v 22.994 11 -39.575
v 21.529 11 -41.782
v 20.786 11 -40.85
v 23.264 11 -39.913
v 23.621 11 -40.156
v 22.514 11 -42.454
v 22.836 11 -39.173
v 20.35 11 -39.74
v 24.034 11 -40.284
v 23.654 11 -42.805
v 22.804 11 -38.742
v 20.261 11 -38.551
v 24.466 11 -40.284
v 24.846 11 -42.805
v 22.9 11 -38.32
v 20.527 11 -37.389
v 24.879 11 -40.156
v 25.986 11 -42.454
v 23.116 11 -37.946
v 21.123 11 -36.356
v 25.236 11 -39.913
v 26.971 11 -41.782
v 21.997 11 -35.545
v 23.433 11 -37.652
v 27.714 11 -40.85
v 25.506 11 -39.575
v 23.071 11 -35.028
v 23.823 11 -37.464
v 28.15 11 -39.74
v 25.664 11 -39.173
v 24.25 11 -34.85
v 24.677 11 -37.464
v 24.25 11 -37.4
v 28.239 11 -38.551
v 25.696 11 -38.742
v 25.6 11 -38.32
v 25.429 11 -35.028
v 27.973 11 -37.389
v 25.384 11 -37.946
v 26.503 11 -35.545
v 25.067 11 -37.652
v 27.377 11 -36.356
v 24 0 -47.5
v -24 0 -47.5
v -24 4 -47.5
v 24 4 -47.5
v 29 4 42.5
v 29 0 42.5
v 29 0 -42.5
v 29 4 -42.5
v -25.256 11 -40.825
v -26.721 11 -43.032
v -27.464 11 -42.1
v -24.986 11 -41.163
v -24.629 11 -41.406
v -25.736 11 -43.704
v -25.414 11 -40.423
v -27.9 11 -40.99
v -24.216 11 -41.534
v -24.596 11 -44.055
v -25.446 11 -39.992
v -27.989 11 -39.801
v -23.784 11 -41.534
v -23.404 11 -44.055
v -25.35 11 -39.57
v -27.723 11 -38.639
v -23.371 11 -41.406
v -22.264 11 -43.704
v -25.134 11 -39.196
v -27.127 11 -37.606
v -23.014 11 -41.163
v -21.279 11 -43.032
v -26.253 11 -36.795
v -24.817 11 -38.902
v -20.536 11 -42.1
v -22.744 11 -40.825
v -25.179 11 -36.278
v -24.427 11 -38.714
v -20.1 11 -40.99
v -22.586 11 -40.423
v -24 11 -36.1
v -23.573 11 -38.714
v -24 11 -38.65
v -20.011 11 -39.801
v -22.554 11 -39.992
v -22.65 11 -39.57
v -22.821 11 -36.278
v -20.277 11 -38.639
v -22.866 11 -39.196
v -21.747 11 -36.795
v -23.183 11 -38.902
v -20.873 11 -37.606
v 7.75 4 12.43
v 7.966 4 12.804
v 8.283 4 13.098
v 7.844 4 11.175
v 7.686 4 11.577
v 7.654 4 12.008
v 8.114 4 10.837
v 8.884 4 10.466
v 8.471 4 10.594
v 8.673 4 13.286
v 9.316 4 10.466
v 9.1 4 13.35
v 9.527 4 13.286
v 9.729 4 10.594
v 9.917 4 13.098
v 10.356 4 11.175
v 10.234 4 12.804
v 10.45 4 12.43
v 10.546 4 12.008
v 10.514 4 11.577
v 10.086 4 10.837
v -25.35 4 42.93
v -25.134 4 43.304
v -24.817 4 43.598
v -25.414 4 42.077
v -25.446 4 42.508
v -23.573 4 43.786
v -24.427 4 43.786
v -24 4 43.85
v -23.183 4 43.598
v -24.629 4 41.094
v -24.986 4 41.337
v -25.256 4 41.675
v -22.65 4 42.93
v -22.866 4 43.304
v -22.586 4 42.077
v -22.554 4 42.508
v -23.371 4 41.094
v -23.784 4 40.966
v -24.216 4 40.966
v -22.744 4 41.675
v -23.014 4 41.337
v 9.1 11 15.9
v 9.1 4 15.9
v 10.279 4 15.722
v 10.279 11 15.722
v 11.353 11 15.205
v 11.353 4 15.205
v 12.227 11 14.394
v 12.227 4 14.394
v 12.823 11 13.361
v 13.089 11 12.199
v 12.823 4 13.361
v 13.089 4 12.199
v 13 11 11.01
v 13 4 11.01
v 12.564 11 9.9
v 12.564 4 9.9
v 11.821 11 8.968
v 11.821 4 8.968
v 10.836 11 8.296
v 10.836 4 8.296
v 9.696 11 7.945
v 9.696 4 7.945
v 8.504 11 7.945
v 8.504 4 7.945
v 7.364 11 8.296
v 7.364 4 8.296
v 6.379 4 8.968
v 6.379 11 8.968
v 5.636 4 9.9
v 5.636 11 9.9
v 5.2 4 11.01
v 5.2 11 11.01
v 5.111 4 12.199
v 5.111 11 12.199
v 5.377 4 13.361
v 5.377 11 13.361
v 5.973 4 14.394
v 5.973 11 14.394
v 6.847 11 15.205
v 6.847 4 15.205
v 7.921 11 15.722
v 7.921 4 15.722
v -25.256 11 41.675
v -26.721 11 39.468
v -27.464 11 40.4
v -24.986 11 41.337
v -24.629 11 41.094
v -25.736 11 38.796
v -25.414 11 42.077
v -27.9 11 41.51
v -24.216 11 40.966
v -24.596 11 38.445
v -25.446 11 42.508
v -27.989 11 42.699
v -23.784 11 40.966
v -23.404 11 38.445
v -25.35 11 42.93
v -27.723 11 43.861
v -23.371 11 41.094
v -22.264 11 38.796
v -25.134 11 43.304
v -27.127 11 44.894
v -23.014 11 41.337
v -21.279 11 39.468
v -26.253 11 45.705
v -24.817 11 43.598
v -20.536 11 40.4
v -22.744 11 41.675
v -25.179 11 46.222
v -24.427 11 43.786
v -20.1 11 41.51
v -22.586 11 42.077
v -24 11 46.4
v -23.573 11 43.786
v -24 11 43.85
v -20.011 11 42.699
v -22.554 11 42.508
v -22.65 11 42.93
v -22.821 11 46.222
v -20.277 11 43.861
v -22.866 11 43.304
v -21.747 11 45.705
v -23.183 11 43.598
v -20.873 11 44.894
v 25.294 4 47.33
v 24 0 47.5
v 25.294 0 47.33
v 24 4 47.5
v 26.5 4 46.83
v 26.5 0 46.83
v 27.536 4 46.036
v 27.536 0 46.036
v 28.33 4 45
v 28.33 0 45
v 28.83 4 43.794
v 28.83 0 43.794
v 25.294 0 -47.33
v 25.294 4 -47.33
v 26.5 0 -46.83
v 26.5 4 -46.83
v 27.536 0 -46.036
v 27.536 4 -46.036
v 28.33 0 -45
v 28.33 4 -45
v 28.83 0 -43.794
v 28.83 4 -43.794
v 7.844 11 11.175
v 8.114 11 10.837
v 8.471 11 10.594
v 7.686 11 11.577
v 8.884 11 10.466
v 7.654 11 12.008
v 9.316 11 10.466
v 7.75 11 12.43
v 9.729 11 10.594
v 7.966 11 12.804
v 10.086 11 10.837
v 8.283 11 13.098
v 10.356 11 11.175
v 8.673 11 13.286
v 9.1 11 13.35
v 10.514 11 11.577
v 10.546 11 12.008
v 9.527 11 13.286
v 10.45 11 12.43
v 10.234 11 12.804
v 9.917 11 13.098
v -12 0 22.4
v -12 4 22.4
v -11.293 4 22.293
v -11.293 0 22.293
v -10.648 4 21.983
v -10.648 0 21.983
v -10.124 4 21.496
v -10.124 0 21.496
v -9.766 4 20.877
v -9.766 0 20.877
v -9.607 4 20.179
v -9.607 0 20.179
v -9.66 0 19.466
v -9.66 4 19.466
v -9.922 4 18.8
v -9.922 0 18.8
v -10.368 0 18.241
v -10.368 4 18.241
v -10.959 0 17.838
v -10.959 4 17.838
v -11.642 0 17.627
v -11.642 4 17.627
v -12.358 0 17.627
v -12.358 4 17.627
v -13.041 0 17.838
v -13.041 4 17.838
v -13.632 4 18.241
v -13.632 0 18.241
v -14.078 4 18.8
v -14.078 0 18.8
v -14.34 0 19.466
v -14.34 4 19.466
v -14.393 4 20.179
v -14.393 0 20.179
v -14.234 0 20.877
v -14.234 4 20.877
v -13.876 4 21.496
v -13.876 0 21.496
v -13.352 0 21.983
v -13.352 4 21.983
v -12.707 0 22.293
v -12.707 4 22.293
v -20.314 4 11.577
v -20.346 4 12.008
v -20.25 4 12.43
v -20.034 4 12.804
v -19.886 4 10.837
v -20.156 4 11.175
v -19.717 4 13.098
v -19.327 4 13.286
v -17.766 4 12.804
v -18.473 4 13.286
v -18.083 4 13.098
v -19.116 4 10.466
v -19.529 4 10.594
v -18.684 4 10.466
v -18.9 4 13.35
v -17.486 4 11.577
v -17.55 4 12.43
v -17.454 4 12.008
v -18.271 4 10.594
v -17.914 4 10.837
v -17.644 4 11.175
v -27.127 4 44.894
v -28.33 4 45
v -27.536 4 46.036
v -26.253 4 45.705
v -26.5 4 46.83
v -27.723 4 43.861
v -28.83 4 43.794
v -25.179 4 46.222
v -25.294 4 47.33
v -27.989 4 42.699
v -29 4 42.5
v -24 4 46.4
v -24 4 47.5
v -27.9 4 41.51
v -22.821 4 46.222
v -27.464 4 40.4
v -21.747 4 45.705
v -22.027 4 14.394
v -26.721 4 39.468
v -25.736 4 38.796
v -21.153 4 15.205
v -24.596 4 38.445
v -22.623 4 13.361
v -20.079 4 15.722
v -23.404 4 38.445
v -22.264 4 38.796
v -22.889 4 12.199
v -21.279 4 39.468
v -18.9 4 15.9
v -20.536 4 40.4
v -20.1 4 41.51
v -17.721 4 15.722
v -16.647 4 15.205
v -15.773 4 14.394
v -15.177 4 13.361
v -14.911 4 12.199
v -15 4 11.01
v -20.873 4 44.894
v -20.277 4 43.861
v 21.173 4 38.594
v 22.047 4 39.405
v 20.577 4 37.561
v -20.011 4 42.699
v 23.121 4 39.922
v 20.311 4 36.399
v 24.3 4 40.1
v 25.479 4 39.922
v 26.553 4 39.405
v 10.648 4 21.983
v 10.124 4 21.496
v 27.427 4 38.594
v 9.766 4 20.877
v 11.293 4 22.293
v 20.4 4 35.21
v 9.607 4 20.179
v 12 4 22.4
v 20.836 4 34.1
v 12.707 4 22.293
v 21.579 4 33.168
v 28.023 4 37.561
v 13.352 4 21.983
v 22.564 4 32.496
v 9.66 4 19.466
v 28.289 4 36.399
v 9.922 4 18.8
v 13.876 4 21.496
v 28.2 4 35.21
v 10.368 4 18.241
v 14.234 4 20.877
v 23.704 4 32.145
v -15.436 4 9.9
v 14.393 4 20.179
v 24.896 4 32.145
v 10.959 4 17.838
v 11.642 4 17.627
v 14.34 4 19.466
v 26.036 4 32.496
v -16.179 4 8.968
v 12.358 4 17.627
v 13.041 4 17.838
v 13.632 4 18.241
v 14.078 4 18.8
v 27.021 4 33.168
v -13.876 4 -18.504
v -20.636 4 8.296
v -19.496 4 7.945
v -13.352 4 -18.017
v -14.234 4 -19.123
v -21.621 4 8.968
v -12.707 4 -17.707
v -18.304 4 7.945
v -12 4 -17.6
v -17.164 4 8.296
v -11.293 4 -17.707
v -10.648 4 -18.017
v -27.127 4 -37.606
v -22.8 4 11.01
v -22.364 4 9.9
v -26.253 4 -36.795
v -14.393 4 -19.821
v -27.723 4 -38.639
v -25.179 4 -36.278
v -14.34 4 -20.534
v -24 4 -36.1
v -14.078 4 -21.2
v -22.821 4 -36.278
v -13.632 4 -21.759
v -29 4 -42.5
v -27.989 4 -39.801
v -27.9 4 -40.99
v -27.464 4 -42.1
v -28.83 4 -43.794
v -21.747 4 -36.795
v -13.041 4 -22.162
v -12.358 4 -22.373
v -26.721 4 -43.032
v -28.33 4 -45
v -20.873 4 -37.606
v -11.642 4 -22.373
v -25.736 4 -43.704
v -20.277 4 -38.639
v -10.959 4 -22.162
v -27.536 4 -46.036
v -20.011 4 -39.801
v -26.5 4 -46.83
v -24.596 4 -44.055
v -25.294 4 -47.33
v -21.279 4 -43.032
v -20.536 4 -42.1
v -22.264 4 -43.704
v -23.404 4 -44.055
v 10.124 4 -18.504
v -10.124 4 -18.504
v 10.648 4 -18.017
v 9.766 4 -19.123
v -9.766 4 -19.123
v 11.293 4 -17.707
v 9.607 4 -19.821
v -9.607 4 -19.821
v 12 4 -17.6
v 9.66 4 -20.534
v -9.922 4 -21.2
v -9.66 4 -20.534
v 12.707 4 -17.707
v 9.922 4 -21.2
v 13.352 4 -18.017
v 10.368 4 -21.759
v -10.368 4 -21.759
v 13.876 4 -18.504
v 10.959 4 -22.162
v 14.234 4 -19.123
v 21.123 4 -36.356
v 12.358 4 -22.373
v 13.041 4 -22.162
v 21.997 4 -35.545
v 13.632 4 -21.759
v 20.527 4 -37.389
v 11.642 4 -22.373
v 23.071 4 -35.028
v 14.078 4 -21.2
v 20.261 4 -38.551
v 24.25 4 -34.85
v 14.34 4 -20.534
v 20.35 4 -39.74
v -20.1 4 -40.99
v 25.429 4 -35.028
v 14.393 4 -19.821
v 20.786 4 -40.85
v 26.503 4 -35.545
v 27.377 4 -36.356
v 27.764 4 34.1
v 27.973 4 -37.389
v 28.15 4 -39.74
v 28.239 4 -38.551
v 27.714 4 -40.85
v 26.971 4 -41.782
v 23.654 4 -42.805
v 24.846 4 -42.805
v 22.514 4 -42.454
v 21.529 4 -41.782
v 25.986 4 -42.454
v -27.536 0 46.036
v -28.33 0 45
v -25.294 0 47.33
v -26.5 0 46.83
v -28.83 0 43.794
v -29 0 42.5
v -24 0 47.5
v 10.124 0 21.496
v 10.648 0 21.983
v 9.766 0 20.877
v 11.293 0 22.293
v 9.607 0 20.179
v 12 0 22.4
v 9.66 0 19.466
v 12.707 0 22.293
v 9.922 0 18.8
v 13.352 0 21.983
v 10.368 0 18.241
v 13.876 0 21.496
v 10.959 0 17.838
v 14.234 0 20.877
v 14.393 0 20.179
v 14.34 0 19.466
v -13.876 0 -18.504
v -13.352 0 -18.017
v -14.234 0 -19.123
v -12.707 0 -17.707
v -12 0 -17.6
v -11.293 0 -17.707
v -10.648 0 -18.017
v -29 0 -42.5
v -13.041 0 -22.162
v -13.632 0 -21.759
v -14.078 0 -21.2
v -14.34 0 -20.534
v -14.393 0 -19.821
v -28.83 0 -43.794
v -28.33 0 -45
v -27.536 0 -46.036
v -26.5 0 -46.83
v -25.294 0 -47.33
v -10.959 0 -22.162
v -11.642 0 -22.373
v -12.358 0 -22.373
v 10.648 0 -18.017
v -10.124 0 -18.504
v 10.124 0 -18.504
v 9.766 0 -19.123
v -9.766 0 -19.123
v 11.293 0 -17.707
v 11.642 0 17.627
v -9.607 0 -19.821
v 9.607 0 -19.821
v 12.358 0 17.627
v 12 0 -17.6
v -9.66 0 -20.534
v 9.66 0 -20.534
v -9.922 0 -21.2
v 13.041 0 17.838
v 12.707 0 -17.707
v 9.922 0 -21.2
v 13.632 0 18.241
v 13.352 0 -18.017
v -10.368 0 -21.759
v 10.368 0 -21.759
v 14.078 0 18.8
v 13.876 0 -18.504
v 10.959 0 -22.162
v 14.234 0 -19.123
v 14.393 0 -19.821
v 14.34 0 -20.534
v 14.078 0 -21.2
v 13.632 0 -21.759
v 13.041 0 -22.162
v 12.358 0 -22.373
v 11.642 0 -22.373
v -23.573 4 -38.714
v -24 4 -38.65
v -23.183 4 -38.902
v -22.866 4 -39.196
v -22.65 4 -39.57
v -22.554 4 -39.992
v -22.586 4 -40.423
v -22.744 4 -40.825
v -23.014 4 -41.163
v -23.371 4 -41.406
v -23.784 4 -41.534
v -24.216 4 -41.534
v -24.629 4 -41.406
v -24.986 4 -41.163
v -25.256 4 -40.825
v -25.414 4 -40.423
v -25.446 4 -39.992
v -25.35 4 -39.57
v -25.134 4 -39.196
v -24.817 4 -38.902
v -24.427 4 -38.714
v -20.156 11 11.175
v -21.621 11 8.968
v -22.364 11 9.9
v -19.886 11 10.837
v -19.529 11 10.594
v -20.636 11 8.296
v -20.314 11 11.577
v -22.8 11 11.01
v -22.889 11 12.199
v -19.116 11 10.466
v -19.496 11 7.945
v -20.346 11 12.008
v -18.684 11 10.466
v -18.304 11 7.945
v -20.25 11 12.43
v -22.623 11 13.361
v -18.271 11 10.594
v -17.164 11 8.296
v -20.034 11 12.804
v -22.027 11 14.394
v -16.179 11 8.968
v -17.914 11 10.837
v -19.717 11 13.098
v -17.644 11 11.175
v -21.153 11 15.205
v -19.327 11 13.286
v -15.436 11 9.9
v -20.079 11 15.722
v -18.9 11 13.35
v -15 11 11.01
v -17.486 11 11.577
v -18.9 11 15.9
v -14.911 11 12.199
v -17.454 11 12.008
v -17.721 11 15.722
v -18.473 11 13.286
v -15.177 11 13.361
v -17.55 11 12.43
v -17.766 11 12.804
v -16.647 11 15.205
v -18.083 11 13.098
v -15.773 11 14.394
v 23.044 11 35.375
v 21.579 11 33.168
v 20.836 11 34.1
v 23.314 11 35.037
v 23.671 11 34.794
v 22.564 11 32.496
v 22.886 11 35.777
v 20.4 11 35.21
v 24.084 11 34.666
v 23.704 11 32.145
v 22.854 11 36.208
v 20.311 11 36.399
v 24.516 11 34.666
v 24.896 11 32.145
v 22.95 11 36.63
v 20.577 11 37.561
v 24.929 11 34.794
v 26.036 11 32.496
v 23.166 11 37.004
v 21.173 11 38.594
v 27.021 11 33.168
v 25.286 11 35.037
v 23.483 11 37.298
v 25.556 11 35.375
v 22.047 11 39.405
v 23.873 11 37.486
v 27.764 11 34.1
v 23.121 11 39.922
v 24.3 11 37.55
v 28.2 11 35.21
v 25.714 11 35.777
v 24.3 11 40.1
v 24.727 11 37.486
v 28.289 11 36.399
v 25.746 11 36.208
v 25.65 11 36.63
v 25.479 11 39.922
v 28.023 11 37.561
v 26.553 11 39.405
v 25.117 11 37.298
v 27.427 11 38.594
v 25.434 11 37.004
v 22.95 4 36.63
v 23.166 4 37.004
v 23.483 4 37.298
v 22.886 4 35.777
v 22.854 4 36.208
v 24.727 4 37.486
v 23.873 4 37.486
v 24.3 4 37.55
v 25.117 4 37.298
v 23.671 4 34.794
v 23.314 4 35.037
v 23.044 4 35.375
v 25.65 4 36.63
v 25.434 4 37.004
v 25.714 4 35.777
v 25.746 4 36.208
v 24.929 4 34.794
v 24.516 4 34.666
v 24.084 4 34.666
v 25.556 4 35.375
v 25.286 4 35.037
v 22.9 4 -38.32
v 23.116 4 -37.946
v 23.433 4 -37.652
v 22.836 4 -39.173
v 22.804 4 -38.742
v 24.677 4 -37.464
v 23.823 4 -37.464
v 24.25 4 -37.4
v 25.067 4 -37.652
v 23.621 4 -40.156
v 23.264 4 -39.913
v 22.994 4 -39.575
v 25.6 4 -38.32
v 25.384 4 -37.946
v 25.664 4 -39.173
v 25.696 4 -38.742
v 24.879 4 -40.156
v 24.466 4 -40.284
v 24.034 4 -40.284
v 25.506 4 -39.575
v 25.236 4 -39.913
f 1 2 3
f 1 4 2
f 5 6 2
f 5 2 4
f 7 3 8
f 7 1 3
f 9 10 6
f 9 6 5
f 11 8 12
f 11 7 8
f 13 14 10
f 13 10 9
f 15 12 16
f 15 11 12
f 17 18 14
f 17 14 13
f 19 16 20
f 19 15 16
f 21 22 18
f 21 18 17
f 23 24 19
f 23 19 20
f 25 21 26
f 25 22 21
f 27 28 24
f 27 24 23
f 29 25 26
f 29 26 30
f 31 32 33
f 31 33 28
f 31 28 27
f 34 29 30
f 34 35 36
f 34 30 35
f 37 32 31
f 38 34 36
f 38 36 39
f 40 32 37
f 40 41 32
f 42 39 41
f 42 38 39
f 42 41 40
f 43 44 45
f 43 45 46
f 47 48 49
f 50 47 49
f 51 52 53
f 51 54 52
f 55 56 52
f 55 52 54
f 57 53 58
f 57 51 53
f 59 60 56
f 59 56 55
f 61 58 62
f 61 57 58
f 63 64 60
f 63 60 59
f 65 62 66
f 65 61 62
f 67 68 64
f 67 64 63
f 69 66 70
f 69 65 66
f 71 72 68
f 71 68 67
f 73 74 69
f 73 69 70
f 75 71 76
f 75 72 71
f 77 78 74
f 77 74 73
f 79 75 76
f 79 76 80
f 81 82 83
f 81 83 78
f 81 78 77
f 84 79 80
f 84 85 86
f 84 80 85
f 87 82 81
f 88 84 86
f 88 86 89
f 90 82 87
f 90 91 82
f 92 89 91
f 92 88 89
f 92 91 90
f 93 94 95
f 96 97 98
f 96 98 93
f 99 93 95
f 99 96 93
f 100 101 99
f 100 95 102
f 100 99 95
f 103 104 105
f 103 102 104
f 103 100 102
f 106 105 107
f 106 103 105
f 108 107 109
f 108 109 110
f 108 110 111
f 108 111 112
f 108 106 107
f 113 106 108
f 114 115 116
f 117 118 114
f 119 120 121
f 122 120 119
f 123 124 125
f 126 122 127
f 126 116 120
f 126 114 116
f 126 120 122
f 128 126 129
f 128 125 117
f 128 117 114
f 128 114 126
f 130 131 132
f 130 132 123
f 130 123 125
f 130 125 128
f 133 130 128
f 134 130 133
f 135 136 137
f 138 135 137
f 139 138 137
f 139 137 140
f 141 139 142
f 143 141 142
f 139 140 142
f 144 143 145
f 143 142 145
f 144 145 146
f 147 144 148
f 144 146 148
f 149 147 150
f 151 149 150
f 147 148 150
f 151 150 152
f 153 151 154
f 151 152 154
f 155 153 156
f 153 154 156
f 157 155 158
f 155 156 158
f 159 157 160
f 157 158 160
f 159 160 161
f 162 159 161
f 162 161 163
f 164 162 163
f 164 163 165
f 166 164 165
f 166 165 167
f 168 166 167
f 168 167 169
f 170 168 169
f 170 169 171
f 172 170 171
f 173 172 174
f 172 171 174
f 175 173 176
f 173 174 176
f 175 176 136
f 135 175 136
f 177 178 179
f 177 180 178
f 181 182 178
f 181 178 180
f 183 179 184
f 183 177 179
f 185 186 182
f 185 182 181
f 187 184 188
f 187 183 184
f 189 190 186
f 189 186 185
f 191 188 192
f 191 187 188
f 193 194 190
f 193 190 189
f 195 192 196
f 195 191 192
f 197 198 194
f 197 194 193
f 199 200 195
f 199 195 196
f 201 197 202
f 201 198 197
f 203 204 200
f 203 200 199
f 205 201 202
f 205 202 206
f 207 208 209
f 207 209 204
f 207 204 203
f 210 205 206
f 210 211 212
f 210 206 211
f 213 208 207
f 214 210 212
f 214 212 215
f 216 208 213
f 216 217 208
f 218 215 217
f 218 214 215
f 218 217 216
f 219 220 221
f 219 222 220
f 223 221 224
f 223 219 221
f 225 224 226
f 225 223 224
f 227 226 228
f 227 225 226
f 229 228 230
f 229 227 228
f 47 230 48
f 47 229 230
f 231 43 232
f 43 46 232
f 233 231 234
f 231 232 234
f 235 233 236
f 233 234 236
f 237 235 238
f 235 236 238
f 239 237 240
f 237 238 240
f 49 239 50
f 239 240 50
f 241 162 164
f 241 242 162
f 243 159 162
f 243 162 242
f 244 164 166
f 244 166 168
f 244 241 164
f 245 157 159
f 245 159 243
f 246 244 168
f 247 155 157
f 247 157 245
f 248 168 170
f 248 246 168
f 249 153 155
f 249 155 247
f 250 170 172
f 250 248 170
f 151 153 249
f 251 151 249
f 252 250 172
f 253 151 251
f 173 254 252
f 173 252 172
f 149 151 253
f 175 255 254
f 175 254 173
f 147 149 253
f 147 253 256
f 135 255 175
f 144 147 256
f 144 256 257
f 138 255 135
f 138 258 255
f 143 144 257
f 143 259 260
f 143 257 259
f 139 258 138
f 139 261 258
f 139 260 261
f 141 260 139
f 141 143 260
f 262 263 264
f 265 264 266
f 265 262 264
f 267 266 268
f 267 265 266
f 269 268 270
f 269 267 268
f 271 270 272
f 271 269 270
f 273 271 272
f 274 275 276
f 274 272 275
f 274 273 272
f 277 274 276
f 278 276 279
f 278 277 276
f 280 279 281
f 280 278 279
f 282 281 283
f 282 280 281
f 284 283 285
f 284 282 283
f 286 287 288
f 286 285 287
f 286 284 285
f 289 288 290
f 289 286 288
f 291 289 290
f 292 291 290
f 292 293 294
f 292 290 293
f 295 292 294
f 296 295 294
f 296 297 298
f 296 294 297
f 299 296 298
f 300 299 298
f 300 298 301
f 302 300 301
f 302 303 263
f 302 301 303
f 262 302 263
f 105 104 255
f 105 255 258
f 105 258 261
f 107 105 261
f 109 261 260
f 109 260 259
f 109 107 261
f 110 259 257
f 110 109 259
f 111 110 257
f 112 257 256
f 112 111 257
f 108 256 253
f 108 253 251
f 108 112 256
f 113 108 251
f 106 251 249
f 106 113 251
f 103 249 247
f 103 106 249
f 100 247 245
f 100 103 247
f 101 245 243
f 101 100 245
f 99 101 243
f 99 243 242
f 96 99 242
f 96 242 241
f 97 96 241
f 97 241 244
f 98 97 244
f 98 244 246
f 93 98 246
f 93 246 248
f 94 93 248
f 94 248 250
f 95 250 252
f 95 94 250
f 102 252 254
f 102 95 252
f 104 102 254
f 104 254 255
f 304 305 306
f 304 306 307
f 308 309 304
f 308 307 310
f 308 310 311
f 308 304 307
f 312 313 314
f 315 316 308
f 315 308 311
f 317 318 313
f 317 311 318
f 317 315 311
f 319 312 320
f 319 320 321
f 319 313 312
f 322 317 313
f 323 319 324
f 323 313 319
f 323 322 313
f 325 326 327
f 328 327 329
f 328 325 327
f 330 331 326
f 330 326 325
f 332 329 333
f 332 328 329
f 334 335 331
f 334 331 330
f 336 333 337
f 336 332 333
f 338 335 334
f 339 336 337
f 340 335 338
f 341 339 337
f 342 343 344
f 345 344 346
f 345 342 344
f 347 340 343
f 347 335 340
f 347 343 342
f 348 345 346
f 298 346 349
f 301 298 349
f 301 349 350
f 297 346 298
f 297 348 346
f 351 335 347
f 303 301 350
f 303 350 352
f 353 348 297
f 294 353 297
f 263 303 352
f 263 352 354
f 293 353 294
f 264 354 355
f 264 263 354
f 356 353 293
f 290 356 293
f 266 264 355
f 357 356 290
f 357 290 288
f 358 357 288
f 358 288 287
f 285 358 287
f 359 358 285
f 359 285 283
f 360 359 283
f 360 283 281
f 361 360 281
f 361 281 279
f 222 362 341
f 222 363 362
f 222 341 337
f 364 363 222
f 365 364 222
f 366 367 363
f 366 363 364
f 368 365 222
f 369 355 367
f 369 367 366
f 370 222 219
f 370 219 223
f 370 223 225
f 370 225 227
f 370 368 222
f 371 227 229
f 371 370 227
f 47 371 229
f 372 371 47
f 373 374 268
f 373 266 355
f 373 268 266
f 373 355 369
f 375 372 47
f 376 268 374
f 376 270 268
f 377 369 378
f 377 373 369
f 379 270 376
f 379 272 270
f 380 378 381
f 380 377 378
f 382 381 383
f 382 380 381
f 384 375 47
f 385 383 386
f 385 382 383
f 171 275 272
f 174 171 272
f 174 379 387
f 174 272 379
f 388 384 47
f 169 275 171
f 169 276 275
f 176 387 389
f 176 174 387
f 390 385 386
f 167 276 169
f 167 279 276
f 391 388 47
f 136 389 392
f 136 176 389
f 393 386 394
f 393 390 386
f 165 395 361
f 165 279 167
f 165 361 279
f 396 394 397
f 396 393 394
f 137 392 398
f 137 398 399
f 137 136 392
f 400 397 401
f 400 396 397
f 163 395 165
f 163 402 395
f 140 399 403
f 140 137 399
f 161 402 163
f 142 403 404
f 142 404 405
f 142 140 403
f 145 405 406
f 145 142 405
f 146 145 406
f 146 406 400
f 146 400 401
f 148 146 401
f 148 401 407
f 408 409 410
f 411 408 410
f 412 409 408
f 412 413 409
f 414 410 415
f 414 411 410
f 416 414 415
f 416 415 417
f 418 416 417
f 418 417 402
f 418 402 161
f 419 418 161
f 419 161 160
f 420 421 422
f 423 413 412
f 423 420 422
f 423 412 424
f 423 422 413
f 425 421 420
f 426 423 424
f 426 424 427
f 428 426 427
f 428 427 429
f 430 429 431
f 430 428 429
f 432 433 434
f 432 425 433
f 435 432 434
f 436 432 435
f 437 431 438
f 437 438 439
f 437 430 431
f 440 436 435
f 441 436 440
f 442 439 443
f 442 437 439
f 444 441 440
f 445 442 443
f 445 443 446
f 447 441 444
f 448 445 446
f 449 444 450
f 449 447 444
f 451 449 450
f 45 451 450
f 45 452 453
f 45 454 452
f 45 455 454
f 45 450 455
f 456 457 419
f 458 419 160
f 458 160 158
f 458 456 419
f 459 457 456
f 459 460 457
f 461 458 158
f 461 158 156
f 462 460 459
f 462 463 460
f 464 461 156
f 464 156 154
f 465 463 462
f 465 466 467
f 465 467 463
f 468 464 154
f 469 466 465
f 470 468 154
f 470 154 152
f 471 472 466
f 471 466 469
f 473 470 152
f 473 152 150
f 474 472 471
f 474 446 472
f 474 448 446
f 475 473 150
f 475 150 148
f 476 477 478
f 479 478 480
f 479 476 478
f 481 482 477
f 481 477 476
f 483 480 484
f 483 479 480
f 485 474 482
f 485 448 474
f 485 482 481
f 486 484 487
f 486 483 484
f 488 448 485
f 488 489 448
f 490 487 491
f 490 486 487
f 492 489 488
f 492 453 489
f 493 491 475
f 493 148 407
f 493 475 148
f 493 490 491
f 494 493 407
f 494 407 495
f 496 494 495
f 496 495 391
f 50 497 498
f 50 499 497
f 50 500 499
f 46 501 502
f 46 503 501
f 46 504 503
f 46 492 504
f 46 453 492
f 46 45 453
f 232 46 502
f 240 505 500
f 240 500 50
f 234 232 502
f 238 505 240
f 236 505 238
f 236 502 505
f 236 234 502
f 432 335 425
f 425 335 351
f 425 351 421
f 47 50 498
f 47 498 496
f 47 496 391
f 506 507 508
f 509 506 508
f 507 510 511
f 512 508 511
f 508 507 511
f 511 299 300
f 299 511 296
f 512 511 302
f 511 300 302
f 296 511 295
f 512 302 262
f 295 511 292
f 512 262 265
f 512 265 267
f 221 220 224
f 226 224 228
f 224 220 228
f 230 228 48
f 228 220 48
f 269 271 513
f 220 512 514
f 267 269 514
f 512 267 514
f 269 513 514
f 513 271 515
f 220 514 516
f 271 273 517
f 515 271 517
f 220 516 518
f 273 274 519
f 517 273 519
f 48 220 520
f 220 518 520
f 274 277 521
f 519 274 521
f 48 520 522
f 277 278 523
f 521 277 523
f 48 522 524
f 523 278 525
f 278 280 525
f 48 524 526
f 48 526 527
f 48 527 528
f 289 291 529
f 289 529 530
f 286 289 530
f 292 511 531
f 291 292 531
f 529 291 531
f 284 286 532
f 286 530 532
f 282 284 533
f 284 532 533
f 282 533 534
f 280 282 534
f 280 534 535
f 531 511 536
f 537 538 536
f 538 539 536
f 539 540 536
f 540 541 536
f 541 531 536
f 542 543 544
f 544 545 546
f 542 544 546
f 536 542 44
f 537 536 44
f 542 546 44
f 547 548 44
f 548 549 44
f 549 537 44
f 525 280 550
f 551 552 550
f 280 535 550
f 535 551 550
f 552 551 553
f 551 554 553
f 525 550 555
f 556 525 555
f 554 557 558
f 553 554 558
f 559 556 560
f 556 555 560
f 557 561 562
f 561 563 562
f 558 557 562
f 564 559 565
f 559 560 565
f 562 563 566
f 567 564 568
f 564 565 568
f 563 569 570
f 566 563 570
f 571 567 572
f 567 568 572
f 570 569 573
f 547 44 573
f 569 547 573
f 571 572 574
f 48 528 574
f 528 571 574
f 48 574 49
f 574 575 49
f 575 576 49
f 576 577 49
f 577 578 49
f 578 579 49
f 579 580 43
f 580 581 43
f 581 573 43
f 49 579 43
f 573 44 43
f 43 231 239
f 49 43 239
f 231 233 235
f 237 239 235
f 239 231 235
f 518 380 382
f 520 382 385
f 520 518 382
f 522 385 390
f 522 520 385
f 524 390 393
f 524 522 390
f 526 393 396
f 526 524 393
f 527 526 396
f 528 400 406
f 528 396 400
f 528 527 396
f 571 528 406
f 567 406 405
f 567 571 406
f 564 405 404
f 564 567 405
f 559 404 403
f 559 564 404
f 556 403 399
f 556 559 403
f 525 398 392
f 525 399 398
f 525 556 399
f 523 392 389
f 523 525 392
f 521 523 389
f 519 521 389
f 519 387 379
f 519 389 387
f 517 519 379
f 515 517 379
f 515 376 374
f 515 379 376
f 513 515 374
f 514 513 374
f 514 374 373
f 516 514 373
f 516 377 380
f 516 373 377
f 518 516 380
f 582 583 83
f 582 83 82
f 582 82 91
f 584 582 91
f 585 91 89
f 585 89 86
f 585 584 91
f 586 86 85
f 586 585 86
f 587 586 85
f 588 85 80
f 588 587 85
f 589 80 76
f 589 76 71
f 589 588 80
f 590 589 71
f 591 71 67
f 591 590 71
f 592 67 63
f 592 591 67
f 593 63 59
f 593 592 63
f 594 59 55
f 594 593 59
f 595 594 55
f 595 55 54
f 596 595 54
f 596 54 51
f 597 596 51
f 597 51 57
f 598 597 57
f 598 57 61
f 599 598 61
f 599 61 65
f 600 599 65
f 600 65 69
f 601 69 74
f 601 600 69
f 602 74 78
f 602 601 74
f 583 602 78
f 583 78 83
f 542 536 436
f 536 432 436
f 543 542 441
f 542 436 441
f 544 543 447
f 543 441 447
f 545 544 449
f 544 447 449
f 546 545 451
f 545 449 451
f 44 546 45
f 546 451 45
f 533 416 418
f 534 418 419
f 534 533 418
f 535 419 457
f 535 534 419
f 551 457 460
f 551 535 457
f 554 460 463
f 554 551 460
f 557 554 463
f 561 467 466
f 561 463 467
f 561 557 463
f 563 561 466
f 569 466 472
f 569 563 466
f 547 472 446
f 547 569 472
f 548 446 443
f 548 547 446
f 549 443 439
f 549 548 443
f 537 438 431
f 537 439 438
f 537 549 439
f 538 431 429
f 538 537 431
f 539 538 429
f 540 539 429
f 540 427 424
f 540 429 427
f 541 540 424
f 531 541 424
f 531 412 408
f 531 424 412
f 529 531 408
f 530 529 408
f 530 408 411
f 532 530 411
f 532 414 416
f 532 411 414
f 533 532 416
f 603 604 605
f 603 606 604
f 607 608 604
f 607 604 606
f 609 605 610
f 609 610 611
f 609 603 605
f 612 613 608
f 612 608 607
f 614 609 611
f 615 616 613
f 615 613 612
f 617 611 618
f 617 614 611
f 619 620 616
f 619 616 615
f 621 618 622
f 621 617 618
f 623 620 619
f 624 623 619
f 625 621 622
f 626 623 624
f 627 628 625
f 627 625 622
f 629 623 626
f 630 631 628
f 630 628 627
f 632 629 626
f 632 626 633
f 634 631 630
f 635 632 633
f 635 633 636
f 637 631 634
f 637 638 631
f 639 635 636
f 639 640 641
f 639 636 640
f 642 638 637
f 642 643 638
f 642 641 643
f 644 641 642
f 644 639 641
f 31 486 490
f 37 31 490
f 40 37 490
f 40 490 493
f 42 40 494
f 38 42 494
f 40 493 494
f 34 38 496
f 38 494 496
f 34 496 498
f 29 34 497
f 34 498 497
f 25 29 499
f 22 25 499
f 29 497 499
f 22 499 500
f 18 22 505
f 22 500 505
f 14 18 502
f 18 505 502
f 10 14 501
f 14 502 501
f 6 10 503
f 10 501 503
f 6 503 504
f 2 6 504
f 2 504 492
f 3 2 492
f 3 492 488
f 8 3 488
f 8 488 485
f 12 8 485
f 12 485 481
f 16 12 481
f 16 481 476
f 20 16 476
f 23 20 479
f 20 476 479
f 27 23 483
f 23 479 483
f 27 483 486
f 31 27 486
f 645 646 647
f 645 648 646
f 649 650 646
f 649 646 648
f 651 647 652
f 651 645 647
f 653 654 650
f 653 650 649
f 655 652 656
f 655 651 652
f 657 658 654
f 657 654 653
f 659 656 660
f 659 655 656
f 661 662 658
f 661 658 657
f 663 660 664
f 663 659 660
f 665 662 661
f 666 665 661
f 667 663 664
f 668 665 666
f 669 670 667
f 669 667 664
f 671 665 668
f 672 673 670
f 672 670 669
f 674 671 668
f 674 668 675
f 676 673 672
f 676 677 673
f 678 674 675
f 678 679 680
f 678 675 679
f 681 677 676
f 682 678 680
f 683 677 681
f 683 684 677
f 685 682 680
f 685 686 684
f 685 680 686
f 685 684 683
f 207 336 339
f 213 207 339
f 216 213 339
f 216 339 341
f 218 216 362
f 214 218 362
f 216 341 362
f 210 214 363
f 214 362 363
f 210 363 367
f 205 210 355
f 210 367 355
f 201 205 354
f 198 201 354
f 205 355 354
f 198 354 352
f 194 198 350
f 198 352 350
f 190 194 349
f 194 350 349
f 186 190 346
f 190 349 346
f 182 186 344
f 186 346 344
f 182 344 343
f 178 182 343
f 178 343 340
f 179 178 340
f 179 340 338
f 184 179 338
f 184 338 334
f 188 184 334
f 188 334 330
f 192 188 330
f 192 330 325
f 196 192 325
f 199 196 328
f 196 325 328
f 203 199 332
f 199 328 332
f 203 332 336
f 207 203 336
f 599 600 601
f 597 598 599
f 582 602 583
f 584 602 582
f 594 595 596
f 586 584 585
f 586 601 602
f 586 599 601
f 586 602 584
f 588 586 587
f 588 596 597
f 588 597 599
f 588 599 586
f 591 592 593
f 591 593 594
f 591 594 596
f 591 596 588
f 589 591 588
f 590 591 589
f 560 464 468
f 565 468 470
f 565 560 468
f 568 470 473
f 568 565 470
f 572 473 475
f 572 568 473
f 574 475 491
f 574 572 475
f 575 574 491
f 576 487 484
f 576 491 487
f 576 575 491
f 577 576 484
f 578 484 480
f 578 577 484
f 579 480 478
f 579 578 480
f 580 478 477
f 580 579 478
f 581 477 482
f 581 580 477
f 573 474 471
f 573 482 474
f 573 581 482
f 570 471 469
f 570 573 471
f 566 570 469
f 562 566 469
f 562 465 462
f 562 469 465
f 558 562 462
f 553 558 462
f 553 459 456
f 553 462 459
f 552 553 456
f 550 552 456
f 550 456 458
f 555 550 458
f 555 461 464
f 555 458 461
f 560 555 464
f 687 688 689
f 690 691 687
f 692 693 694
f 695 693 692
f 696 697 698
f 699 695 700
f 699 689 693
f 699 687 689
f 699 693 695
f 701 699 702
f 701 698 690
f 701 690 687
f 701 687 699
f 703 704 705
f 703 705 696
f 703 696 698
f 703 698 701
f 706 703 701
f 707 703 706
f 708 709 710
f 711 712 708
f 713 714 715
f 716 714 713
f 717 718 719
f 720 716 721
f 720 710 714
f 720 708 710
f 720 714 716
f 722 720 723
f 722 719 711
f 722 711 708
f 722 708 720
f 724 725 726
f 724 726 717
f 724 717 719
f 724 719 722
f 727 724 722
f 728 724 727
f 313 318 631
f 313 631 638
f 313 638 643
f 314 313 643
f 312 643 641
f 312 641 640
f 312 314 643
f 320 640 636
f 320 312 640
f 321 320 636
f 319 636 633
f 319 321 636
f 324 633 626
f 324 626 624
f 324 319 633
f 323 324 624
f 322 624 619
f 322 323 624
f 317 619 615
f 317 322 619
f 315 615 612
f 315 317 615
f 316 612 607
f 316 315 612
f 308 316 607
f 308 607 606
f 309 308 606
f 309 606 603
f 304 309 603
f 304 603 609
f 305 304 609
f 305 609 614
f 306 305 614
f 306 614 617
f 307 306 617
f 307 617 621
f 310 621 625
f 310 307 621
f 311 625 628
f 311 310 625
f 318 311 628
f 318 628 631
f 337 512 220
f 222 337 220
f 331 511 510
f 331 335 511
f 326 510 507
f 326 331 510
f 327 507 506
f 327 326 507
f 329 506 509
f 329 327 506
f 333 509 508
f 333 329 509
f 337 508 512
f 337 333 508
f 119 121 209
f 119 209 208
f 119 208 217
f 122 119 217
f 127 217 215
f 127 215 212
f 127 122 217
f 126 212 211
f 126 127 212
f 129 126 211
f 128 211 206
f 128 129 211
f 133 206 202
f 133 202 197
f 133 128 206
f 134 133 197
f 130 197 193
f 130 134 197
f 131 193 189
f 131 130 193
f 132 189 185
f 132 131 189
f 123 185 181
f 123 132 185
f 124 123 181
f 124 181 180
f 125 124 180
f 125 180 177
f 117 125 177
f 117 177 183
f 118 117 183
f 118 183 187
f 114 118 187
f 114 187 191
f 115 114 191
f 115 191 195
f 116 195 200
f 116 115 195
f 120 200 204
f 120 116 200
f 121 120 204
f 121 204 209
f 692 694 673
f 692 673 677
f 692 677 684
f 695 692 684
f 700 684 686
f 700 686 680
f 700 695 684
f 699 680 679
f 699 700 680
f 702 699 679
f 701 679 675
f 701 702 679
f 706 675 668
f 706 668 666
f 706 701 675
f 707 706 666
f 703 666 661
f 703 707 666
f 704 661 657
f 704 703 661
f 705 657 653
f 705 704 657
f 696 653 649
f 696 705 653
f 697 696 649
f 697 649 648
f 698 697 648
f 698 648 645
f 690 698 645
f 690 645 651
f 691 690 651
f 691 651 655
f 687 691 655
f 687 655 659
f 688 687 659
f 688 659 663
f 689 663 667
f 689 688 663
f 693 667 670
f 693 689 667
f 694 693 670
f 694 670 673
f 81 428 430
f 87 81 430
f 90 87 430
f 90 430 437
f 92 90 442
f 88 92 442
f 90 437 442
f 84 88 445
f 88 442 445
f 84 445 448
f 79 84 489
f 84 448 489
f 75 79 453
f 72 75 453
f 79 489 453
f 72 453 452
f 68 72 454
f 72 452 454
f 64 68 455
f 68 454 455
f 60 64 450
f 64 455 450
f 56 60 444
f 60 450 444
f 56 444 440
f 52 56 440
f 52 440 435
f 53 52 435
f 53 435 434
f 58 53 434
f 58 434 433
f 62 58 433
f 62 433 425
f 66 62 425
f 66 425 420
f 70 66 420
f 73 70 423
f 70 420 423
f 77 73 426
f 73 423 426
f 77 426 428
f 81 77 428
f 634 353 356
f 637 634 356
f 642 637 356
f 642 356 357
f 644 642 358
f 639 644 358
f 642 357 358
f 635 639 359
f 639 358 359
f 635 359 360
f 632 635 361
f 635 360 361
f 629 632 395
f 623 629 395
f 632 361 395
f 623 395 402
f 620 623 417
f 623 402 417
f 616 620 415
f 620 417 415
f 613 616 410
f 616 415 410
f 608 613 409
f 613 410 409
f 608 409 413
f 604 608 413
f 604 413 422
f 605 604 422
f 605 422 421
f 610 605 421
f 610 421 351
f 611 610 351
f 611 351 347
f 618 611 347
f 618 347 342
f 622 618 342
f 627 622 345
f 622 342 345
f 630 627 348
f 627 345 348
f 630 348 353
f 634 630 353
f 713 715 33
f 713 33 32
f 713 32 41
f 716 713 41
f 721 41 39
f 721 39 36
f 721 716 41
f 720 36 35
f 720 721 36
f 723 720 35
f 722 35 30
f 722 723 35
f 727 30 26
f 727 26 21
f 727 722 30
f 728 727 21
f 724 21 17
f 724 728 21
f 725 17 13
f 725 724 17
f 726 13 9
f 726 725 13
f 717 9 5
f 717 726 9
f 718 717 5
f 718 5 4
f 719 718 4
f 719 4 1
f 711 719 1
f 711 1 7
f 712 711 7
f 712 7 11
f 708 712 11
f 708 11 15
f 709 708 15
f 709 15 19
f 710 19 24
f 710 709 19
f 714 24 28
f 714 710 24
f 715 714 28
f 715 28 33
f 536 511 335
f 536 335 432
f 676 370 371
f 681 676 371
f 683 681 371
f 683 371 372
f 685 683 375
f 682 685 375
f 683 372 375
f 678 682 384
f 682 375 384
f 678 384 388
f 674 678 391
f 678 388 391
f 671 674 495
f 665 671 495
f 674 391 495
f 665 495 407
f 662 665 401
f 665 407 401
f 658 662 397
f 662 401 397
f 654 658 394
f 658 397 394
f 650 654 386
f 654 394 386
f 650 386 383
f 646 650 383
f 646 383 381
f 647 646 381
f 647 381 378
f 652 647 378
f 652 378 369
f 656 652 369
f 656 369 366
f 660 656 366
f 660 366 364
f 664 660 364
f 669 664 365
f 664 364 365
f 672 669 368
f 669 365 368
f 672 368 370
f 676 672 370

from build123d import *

# Parameters (mm, degrees)
SKETCH1_W           = 58
SKETCH1_H           = 95
BOSS_EXTRUDE1_DEPTH = 4
SKETCH2_R           = 4
SKETCH2_R_2         = 1.45
BOSS_EXTRUDE2_DEPTH = 7
FILLET1_R           = 5
CUT_EXTRUDE1_REACH  = 58.73
SKETCH3_R           = 2.4


with BuildPart() as part:
    # Sketch1 → Boss-Extrude1 (new body)
    with BuildSketch(Plane(origin=(0, 0, 0), x_dir=(1, 0, 0), z_dir=(0, 1, 0))):
        Rectangle(SKETCH1_W, SKETCH1_H)
    extrude(amount=BOSS_EXTRUDE1_DEPTH)

    # Sketch2 → Boss-Extrude2 (add)
    # profile 1 of 6: a face of its own
    with BuildSketch(Plane(origin=(0, 4, 0), x_dir=(1, 0, 0), z_dir=(0, 1, 0))):
        with Locations(Location((-24, 40.1, 0), (0, 0, 270))):
            Circle(SKETCH2_R)
        with Locations(Location((-24, 40.1, 0), (0, 0, 270))):
            Circle(SKETCH2_R_2, mode=Mode.SUBTRACT)
    # profile 2 of 6: a face of its own
    with BuildSketch(Plane(origin=(0, 4, 0), x_dir=(1, 0, 0), z_dir=(0, 1, 0))):
        with Locations(Location((24.25, 38.85, 0), (0, 0, 270))):
            Circle(SKETCH2_R)
        with Locations(Location((24.25, 38.85, 0), (0, 0, 270))):
            Circle(SKETCH2_R_2, mode=Mode.SUBTRACT)
    # profile 3 of 6: a face of its own
    with BuildSketch(Plane(origin=(0, 4, 0), x_dir=(1, 0, 0), z_dir=(0, 1, 0))):
        with Locations(Location((-18.9, -11.9, 0), (0, 0, 270))):
            Circle(SKETCH2_R)
        with Locations(Location((-18.9, -11.9, 0), (0, 0, 270))):
            Circle(SKETCH2_R_2, mode=Mode.SUBTRACT)
    # profile 4 of 6: a face of its own
    with BuildSketch(Plane(origin=(0, 4, 0), x_dir=(1, 0, 0), z_dir=(0, 1, 0))):
        with Locations(Location((9.1, -11.9, 0), (0, 0, 270))):
            Circle(SKETCH2_R)
        with Locations(Location((9.1, -11.9, 0), (0, 0, 270))):
            Circle(SKETCH2_R_2, mode=Mode.SUBTRACT)
    # profile 5 of 6: a face of its own
    with BuildSketch(Plane(origin=(0, 4, 0), x_dir=(1, 0, 0), z_dir=(0, 1, 0))):
        with Locations(Location((-24, -42.4, 0), (0, 0, 270))):
            Circle(SKETCH2_R)
        with Locations(Location((-24, -42.4, 0), (0, 0, 270))):
            Circle(SKETCH2_R_2, mode=Mode.SUBTRACT)
    # profile 6 of 6: a face of its own
    with BuildSketch(Plane(origin=(0, 4, 0), x_dir=(1, 0, 0), z_dir=(0, 1, 0))):
        with Locations(Location((24.3, -36.1, 0), (0, 0, 270))):
            Circle(SKETCH2_R)
        with Locations(Location((24.3, -36.1, 0), (0, 0, 270))):
            Circle(SKETCH2_R_2, mode=Mode.SUBTRACT)
    extrude(amount=BOSS_EXTRUDE2_DEPTH)

    # Fillet1
    fillet1_edges = [part.edges().sort_by_distance(p)[0] for p in [
        (29, 2, 47.5),
        (-29, 2, 47.5),
        (-29, 2, -47.5),
        (29, 2, -47.5),
    ]]
    fillet(fillet1_edges, radius=FILLET1_R)

    # Sketch3 → Cut-Extrude1 (cut, up to next)
    with BuildSketch(Plane(origin=(0, 0, 0), x_dir=(1, 0, 0), z_dir=(0, 1, 0)), mode=Mode.PRIVATE) as cut_extrude1_sk1:
        with Locations(Location((-12, 20, 0), (0, 0, 270))):
            Circle(SKETCH3_R)
    cut_extrude1_tool1 = extrude(cut_extrude1_sk1.sketch, amount=CUT_EXTRUDE1_REACH, mode=Mode.PRIVATE) & part.part
    # Sketch3 → Cut-Extrude1 (cut, up to next)
    with BuildSketch(Plane(origin=(0, 0, 0), x_dir=(1, 0, 0), z_dir=(0, 1, 0)), mode=Mode.PRIVATE) as cut_extrude1_sk2:
        with Locations(Location((12, 20, 0), (0, 0, 270))):
            Circle(SKETCH3_R)
    cut_extrude1_tool2 = extrude(cut_extrude1_sk2.sketch, amount=CUT_EXTRUDE1_REACH, mode=Mode.PRIVATE) & part.part
    # Sketch3 → Cut-Extrude1 (cut, up to next)
    with BuildSketch(Plane(origin=(0, 0, 0), x_dir=(1, 0, 0), z_dir=(0, 1, 0)), mode=Mode.PRIVATE) as cut_extrude1_sk3:
        with Locations(Location((-12, -20, 0), (0, 0, 270))):
            Circle(SKETCH3_R)
    cut_extrude1_tool3 = extrude(cut_extrude1_sk3.sketch, amount=CUT_EXTRUDE1_REACH, mode=Mode.PRIVATE) & part.part
    # Sketch3 → Cut-Extrude1 (cut, up to next)
    with BuildSketch(Plane(origin=(0, 0, 0), x_dir=(1, 0, 0), z_dir=(0, 1, 0)), mode=Mode.PRIVATE) as cut_extrude1_sk4:
        with Locations(Location((12, -20, 0), (0, 0, 270))):
            Circle(SKETCH3_R)
    cut_extrude1_tool4 = extrude(cut_extrude1_sk4.sketch, amount=CUT_EXTRUDE1_REACH, mode=Mode.PRIVATE) & part.part
    add(cut_extrude1_tool1.solids().sort_by_distance((-12, 0, -20))[0], mode=Mode.SUBTRACT)
    add(cut_extrude1_tool2.solids().sort_by_distance((12, 0, -20))[0], mode=Mode.SUBTRACT)
    add(cut_extrude1_tool3.solids().sort_by_distance((-12, 0, 20))[0], mode=Mode.SUBTRACT)
    add(cut_extrude1_tool4.solids().sort_by_distance((12, 0, 20))[0], mode=Mode.SUBTRACT)


solid = part.part
